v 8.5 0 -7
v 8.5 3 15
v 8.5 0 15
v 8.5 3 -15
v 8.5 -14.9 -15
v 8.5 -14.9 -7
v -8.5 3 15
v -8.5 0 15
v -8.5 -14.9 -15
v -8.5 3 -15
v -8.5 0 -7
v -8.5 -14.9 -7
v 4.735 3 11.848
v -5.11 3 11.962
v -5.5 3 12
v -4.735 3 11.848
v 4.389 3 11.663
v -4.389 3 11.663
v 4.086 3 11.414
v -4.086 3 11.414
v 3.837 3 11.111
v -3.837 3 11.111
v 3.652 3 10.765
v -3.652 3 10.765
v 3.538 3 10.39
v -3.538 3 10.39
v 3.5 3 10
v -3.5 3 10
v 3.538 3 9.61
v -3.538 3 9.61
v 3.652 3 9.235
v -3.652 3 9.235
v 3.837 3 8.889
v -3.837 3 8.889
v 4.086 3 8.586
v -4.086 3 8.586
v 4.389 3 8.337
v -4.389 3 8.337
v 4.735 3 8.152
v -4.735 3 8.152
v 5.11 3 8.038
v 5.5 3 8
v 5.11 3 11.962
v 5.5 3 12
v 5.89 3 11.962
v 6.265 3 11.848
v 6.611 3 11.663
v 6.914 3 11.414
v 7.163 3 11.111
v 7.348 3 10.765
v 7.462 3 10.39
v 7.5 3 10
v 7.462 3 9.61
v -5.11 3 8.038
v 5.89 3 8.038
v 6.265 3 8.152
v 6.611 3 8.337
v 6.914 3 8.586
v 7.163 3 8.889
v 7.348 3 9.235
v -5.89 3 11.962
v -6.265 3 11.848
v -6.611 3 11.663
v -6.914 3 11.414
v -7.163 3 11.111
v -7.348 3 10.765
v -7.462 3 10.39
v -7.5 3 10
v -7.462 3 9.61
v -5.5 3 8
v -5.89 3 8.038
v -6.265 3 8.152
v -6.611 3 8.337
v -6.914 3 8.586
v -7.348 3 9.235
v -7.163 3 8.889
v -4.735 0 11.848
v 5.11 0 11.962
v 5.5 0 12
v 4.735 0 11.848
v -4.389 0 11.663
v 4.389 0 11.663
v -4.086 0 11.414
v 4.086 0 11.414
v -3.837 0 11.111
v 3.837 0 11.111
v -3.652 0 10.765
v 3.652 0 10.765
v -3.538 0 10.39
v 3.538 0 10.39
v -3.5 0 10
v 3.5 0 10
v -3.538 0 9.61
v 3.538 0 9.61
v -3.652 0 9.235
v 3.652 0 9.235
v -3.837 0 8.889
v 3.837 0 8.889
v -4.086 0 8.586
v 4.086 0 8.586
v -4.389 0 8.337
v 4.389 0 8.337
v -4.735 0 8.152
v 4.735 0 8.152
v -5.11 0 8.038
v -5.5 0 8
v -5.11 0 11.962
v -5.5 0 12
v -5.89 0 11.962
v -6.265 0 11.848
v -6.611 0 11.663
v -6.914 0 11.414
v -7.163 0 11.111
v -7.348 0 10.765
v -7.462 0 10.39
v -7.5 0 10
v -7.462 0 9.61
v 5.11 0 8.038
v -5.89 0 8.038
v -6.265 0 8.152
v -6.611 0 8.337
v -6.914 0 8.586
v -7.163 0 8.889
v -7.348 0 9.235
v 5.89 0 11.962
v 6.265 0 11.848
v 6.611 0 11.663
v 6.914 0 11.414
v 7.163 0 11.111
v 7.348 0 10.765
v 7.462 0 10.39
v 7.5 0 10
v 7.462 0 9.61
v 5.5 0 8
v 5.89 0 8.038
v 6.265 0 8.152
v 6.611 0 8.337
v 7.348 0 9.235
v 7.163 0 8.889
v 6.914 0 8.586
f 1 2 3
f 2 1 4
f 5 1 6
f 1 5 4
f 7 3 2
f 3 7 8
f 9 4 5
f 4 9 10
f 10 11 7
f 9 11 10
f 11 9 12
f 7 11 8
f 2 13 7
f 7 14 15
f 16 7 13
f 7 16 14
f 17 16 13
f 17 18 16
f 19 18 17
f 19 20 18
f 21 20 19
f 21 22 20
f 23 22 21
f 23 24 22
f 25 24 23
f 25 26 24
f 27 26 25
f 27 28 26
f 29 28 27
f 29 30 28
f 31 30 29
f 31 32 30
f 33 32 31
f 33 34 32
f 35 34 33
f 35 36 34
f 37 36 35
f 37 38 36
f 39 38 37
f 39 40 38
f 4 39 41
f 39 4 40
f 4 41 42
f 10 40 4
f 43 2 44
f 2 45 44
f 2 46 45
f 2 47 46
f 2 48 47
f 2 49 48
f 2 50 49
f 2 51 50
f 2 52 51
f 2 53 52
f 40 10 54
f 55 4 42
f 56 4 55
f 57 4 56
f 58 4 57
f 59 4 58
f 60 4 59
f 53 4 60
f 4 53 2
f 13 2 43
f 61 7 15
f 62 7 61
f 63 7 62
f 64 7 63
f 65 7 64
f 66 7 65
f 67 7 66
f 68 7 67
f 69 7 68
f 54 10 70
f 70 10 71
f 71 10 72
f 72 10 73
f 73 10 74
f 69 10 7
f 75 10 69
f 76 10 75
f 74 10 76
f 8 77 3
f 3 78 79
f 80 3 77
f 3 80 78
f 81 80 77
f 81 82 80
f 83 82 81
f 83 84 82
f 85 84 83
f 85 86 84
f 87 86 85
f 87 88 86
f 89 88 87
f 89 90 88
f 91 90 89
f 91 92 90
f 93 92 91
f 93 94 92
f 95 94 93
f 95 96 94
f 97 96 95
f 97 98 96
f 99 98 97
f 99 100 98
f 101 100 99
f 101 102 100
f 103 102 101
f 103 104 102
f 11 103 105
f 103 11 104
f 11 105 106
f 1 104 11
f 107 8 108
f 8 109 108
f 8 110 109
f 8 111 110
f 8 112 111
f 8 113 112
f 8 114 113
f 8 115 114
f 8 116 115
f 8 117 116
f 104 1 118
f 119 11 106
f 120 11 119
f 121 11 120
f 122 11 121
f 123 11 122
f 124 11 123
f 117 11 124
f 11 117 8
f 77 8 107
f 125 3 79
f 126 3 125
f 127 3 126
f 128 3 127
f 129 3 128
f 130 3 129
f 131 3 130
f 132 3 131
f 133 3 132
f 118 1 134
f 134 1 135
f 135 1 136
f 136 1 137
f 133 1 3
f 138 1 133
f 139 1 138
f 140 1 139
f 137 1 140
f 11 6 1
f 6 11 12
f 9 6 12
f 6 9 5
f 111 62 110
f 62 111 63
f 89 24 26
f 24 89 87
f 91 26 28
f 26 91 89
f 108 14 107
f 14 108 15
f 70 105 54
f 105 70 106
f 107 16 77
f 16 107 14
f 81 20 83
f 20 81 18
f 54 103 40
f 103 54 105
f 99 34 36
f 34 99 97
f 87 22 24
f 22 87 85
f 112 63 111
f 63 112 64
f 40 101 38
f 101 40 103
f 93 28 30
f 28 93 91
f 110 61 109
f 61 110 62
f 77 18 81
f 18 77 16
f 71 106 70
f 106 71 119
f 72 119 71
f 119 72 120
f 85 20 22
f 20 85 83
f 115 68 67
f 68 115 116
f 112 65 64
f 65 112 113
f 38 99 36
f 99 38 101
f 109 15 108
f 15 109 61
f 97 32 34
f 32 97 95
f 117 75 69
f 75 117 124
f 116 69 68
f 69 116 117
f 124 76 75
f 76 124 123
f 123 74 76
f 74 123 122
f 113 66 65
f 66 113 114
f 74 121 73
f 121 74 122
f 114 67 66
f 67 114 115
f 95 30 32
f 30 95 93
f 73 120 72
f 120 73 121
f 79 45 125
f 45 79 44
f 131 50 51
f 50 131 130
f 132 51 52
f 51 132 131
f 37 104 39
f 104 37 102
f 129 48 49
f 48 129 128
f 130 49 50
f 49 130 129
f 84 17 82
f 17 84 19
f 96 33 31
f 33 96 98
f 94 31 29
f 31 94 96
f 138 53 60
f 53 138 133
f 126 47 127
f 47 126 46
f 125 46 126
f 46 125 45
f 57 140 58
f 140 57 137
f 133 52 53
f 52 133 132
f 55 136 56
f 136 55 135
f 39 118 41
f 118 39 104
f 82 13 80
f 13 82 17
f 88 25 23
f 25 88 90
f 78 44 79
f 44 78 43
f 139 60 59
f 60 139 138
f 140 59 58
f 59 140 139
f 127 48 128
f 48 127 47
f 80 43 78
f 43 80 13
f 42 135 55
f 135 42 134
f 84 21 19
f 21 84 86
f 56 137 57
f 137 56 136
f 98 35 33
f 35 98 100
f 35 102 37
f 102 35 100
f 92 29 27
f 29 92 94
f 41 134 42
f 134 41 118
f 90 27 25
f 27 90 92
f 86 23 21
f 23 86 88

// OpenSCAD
$fa = 1;
$fs = 0.4;

fudge = 0.1;
wall = 3;


frame_screw_distance = 15;
frame_screw_hole_d = 4;
frame_width = 18;
frame_height = 30;

switch_screw_distance = 11;
switch_screw_hole_d = 4;
switch_width = 17;
switch_height = 30;
switch_depth = 18;

switch_carriage();


module switch_carriage() {
    
    bottom_block_depth = switch_depth - wall;
    bottom_block_height = switch_screw_hole_d*2;
    
    difference() {
        
        union() {
            // back plate
            translate([0, wall/2, 0])
            cube([switch_width, wall, switch_height], center=true);
            
            // bottom block
            translate([
                0,
                (bottom_block_depth/-2) + fudge,
                (switch_height/-2) + (bottom_block_height/2)
            ])
            cube([switch_width, bottom_block_depth, bottom_block_height], center=true);
    
        }
        
        // top screw holes
        translate([0, wall, switch_height/3])
            for (s = [-2:4:2]) {
                translate([switch_screw_distance/s, 0, 0])
                rotate([90, 0, 0])
                cylinder(wall*4, d=switch_screw_hole_d, center=true);
            }

    }
    
    
}
